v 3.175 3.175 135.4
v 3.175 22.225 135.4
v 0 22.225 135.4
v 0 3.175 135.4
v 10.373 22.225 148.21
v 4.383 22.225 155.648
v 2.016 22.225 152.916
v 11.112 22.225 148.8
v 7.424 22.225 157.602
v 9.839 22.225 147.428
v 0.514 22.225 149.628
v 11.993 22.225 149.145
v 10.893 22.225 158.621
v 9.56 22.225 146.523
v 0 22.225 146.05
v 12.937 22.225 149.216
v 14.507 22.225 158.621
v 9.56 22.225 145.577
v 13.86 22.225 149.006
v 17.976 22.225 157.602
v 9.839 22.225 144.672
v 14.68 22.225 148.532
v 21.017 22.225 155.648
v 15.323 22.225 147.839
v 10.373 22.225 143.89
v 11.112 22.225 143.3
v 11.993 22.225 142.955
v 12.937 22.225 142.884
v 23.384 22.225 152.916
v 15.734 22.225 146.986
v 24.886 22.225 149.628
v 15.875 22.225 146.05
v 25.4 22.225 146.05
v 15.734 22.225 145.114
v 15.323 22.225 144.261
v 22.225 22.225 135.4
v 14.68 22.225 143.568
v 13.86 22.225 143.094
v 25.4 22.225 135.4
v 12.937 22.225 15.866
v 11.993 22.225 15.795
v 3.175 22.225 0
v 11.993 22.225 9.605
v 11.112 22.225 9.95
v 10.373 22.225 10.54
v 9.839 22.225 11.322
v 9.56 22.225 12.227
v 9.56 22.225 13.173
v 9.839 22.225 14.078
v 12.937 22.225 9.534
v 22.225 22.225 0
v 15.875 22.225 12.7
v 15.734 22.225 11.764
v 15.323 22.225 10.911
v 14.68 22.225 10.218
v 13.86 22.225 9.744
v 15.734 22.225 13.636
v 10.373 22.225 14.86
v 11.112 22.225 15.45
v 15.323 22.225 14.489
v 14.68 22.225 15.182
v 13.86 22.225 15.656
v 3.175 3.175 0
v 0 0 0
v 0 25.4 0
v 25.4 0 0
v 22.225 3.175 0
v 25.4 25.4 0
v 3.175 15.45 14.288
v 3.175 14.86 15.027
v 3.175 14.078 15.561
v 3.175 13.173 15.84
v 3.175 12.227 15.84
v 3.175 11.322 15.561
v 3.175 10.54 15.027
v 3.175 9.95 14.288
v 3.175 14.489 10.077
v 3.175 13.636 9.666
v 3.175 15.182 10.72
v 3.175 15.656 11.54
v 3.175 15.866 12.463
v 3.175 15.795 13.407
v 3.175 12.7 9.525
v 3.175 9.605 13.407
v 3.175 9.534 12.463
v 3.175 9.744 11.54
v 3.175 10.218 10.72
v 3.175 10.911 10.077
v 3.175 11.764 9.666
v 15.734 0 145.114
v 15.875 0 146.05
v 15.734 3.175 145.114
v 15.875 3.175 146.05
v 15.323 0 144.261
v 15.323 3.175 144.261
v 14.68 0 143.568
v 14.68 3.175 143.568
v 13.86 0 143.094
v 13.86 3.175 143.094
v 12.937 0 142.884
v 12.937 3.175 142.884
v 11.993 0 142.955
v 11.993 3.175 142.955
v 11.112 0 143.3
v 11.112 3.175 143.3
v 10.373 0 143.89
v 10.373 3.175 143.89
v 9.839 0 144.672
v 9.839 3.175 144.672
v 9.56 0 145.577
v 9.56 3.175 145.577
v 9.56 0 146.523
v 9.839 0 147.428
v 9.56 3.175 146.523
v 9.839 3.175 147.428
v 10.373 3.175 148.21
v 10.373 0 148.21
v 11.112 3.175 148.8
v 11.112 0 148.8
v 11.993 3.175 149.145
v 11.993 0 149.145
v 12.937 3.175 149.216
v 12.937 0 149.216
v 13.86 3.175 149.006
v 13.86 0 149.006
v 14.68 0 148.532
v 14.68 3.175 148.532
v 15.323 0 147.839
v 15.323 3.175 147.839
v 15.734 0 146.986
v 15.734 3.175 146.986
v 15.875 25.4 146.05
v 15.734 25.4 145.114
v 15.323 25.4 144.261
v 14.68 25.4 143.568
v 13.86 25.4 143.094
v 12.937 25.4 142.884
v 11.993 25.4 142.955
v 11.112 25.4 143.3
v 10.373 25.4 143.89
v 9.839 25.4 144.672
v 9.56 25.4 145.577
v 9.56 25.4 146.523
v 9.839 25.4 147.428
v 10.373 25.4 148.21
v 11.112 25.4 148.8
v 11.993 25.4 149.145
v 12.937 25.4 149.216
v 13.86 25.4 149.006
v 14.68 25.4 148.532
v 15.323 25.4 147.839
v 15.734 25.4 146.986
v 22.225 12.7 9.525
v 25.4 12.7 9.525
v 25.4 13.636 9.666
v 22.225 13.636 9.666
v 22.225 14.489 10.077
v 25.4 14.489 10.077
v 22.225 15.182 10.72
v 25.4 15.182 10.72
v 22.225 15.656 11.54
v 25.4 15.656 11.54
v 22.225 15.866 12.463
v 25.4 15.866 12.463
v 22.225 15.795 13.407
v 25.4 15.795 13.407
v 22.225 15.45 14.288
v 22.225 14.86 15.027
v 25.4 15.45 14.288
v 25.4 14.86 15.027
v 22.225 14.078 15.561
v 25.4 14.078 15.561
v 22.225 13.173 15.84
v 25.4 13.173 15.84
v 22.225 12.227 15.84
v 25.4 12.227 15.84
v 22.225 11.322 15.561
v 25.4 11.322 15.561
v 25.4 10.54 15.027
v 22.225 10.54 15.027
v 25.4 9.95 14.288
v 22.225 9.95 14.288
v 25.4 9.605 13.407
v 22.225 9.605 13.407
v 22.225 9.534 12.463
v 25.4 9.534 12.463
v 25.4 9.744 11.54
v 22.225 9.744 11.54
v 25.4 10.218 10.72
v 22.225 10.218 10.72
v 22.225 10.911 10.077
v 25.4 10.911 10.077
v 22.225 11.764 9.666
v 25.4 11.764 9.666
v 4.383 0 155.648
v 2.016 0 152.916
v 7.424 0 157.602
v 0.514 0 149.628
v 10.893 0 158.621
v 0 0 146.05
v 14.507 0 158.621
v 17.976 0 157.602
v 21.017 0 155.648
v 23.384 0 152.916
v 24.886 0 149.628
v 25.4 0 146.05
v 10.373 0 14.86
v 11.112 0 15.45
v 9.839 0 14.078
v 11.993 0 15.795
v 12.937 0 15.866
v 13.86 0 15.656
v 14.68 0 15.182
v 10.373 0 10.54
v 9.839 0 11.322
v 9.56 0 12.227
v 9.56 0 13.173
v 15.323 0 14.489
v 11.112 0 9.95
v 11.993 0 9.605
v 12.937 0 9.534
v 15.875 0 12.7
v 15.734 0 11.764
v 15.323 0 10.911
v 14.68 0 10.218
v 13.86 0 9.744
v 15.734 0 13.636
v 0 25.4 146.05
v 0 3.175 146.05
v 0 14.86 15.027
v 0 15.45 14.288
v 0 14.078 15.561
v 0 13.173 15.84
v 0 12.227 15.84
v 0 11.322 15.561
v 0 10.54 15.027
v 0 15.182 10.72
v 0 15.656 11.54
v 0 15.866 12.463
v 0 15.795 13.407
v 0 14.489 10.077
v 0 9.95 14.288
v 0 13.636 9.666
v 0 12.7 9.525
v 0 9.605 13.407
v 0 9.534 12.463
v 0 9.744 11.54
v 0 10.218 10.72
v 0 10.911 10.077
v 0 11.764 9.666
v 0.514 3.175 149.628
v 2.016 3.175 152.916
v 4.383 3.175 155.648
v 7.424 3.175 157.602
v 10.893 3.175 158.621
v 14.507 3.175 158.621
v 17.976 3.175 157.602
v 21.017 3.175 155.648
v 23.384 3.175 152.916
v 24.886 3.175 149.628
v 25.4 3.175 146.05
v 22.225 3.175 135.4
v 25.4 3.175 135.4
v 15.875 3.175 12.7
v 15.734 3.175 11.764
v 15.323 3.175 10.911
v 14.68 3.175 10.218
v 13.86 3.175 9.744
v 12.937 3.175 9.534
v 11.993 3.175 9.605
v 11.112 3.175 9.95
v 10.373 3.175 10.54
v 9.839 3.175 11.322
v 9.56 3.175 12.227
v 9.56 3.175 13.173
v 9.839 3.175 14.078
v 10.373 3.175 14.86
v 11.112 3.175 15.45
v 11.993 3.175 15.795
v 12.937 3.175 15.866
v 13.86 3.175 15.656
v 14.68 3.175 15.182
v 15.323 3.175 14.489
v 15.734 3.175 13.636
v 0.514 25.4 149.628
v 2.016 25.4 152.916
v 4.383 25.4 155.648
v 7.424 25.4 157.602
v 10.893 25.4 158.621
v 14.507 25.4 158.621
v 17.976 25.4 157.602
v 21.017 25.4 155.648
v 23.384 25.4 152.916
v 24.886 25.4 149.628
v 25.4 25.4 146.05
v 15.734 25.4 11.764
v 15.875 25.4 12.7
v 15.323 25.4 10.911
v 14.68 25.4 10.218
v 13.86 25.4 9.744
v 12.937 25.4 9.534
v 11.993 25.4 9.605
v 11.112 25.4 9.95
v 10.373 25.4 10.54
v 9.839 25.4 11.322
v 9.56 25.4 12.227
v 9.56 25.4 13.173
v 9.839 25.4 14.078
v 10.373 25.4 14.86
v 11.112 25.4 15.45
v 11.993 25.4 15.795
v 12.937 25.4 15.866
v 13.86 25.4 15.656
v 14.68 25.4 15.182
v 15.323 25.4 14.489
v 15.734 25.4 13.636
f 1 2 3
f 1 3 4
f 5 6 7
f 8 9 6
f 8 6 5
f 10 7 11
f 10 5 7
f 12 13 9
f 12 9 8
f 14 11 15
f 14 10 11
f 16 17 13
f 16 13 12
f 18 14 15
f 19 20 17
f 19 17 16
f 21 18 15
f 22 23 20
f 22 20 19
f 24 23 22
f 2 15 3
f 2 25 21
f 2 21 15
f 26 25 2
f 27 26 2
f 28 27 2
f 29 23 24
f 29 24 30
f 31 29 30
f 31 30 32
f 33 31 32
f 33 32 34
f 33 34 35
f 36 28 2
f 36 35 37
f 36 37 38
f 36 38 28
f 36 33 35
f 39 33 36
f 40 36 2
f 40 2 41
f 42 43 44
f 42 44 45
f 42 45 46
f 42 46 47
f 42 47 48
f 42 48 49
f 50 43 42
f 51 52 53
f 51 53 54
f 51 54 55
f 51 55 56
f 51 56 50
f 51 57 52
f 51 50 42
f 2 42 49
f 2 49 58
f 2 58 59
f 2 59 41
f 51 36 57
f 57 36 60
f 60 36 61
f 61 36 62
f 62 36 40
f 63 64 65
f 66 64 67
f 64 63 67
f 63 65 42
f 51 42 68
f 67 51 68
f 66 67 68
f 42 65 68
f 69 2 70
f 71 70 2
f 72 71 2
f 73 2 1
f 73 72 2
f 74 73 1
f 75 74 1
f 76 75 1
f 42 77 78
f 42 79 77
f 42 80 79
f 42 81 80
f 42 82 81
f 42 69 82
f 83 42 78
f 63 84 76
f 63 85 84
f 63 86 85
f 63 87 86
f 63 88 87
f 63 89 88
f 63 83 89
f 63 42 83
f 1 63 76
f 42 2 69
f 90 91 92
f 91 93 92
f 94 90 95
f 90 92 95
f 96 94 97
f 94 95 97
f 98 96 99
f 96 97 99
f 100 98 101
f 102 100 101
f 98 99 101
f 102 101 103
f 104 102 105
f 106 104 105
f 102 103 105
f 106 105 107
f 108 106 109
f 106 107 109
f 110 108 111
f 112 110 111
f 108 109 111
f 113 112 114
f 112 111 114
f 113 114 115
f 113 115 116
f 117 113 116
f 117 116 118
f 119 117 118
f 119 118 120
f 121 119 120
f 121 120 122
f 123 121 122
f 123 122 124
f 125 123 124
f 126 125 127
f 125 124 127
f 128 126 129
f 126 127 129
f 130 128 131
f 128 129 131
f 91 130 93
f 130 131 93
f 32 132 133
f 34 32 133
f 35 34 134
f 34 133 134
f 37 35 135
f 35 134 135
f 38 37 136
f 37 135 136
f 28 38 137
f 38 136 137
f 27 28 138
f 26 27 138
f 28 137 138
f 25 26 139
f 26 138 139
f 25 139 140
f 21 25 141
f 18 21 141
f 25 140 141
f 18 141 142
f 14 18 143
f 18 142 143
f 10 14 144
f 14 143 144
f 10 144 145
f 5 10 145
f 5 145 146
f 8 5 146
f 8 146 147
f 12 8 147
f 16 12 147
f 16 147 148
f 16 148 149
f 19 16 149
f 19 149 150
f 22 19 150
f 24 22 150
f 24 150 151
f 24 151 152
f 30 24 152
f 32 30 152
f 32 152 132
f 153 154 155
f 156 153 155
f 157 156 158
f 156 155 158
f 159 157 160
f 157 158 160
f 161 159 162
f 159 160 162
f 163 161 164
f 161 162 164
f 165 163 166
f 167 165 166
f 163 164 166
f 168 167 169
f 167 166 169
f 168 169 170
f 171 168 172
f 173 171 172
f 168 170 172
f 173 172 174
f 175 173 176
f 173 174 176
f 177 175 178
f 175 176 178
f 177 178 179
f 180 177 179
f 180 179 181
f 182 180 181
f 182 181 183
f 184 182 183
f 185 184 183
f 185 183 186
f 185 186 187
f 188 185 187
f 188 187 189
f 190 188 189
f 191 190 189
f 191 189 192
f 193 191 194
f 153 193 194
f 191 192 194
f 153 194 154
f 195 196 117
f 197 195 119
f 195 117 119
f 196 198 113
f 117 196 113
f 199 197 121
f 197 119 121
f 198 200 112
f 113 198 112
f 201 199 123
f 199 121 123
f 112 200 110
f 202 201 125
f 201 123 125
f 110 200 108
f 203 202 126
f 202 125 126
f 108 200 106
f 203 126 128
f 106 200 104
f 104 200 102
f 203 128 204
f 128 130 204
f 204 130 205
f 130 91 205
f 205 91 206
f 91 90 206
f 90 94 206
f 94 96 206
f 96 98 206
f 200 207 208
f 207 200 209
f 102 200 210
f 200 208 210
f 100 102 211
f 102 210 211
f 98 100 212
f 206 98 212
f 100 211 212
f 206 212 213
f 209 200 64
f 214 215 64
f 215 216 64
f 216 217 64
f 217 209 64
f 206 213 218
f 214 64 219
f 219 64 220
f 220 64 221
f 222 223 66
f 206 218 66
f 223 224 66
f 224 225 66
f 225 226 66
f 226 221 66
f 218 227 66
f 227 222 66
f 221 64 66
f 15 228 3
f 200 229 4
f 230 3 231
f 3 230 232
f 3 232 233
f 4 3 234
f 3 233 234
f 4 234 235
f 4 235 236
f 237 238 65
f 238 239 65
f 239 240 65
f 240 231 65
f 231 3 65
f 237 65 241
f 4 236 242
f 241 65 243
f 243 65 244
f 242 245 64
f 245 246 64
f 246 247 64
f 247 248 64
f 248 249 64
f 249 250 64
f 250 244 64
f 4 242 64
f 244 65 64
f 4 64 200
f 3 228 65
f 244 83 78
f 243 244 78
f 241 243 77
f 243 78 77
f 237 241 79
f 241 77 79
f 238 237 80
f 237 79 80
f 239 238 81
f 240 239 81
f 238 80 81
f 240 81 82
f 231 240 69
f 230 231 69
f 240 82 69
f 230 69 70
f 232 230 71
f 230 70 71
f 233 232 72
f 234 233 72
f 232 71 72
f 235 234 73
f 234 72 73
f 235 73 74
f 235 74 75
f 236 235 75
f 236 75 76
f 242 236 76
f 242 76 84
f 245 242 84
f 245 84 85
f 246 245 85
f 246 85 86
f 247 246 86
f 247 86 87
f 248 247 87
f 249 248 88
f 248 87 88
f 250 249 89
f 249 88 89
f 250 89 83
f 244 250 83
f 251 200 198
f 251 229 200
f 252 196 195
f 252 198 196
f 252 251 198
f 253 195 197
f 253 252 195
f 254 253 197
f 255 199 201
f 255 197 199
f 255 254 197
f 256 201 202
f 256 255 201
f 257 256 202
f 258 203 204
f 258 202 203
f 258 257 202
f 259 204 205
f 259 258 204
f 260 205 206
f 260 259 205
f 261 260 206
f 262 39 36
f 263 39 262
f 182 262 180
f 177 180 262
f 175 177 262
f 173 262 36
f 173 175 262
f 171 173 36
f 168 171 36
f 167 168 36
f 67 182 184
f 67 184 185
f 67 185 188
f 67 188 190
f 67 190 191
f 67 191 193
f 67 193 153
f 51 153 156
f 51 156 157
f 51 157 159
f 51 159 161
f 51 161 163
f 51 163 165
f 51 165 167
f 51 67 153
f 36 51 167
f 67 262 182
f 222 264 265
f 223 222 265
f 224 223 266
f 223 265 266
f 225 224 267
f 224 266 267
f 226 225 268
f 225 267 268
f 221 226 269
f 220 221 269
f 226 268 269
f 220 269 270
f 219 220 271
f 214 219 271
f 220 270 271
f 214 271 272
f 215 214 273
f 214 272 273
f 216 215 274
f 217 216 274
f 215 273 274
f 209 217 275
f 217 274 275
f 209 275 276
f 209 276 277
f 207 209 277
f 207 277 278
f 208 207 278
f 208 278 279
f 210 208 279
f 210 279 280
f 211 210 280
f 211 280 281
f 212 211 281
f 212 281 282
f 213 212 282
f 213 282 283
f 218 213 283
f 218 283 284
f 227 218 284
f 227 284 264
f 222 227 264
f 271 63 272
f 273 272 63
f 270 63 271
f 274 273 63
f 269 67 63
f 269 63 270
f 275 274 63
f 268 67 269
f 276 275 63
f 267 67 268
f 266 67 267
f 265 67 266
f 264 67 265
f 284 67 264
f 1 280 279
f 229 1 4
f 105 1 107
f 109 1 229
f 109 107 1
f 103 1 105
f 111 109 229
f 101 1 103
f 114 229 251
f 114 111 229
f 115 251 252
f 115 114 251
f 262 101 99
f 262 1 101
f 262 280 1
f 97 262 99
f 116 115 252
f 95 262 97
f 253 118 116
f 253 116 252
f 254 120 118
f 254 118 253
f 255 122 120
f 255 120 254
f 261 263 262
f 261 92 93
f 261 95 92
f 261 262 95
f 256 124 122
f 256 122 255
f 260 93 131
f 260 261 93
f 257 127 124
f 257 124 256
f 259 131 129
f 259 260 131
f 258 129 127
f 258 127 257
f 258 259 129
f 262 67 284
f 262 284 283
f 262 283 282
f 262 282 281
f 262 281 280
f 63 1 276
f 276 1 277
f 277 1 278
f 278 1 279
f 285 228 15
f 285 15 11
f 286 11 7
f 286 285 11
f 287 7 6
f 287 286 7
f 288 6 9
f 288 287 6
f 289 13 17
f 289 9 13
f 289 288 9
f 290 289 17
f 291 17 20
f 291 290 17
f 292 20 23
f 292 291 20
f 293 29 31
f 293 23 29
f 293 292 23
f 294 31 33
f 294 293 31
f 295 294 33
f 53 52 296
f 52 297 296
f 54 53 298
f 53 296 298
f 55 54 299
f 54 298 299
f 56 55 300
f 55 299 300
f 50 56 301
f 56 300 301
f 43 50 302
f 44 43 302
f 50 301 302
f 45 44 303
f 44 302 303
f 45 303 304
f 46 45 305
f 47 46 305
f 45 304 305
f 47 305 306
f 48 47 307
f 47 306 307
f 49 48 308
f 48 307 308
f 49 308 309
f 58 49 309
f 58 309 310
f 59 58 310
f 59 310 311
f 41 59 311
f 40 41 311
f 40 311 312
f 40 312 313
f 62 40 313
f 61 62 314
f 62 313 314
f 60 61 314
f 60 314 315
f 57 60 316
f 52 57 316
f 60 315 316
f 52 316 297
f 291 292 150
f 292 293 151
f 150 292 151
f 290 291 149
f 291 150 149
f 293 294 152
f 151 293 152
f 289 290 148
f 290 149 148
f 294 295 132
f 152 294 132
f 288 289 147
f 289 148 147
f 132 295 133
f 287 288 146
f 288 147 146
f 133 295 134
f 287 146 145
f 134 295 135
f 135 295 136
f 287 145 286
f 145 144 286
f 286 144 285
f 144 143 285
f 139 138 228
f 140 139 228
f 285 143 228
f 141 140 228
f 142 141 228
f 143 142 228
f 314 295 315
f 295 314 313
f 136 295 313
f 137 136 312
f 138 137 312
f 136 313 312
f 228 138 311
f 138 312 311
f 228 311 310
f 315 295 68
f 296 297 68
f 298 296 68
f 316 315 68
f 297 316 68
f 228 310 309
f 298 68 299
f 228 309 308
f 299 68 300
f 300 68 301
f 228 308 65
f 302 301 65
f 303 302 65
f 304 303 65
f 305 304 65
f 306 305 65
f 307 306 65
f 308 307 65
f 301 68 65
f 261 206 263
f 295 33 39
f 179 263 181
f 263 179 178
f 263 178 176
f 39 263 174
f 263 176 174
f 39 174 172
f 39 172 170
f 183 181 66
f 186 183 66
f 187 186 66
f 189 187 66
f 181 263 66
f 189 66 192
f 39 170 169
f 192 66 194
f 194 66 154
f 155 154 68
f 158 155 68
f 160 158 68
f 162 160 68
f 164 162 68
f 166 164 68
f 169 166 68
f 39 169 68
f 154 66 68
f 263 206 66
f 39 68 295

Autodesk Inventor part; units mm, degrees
ref_plane "YZ Plane" through (0, 0, 0) normal (1, 0, 0) x (0, 1, 0)
ref_plane "XZ Plane" through (0, 0, 0) normal (0, 1, 0) x (-1, 0, 0)
ref_plane "XY Plane" through (0, 0, 0) normal (0, 0, 1) x (1, 0, 0)
sketch "Sketch1" plane through (0, 0, 0) normal (0, 0, 1) x (1, 0, 0)
  line L0 (0, 0) -> (25.4, 0)
  line L1 (25.4, 0) -> (25.4, 25.4)
  line L2 (25.4, 25.4) -> (0, 25.4)
  line L3 (0, 25.4) -> (0, 0)
  line L4 (3.175, 3.175) -> (22.225, 3.175)
  line L5 (22.225, 3.175) -> (22.225, 22.225)
  line L6 (22.225, 22.225) -> (3.175, 22.225)
  line L7 (3.175, 22.225) -> (3.175, 3.175)
  dimension "d0" = 3.175
  dimension "d1" = 3.175
  dimension "d2" = 3.175
  dimension "d3" = 3.175
  dimension "d4" = 25.4
  dimension "d5" = 25.4
extrude "Extrusion1" add sketch "Sketch1" along normal blind 158.75
sketch "Sketch2" plane through (0, 25.4, 0) normal (0, 1, 0) x (1, 0, 0)
  line L0 (0, -158.75) -> (25.4, -158.75) projected
  line L1 (25.4, 0) -> (25.4, -158.75) projected
  line L2 (25.4, 0) -> (0, 0) projected
  line L3 (0, 0) -> (0, -158.75) projected
  circle A0 centre (12.7, -146.05) radius 3.175
  arc A1 (0, -146.05) -> (25.4, -146.05) centre (12.7, -146.05) ccw
  circle A2 centre (12.7, -12.7) radius 3.175
  point P0 (12.7, 0)
  dimension "d8" = 6.35
  dimension "d17" = 12.7
  dimension "d18" = 6.35
extrude "Extrusion2" cut sketch "Sketch2" against normal through all contours L3 A1 L0 | A1 L1 L0 | A0 | A2
sketch "Sketch3" plane through (25.4, 0, 0) normal (1, 0, 0) x (0, 0, -1)
  line L0 (0, 0) -> (0, 25.4) projected
  line L1 (0, 25.4) -> (-146.05, 25.4) projected
  line L2 (-154.4503, 3.175) -> (-154.4503, 22.225) projected
  line L3 (-154.4503, 22.225) -> (-135.4003, 22.225)
  line L4 (-135.4003, 22.225) -> (-135.4003, 3.175)
  line L5 (-135.4003, 3.175) -> (-154.4503, 3.175)
  line L6 (-154.4503, 3.175) -> (-154.4503, 22.225)
  circle A0 centre (-12.7, 12.7) radius 3.175
  dimension "d11" = 19.05
  dimension "d12" = 6.35
  dimension "d13" = 12.7
  dimension "d14" = 12.7
extrude "Extrusion3" cut sketch "Sketch3" against normal through all
equation "\"d0\" = d3"
equation "\"d1\" = d3"
equation "\"d2\" = d1"
equation "\"d18\" = d8"
properties part number "pnumatic arm lever"
